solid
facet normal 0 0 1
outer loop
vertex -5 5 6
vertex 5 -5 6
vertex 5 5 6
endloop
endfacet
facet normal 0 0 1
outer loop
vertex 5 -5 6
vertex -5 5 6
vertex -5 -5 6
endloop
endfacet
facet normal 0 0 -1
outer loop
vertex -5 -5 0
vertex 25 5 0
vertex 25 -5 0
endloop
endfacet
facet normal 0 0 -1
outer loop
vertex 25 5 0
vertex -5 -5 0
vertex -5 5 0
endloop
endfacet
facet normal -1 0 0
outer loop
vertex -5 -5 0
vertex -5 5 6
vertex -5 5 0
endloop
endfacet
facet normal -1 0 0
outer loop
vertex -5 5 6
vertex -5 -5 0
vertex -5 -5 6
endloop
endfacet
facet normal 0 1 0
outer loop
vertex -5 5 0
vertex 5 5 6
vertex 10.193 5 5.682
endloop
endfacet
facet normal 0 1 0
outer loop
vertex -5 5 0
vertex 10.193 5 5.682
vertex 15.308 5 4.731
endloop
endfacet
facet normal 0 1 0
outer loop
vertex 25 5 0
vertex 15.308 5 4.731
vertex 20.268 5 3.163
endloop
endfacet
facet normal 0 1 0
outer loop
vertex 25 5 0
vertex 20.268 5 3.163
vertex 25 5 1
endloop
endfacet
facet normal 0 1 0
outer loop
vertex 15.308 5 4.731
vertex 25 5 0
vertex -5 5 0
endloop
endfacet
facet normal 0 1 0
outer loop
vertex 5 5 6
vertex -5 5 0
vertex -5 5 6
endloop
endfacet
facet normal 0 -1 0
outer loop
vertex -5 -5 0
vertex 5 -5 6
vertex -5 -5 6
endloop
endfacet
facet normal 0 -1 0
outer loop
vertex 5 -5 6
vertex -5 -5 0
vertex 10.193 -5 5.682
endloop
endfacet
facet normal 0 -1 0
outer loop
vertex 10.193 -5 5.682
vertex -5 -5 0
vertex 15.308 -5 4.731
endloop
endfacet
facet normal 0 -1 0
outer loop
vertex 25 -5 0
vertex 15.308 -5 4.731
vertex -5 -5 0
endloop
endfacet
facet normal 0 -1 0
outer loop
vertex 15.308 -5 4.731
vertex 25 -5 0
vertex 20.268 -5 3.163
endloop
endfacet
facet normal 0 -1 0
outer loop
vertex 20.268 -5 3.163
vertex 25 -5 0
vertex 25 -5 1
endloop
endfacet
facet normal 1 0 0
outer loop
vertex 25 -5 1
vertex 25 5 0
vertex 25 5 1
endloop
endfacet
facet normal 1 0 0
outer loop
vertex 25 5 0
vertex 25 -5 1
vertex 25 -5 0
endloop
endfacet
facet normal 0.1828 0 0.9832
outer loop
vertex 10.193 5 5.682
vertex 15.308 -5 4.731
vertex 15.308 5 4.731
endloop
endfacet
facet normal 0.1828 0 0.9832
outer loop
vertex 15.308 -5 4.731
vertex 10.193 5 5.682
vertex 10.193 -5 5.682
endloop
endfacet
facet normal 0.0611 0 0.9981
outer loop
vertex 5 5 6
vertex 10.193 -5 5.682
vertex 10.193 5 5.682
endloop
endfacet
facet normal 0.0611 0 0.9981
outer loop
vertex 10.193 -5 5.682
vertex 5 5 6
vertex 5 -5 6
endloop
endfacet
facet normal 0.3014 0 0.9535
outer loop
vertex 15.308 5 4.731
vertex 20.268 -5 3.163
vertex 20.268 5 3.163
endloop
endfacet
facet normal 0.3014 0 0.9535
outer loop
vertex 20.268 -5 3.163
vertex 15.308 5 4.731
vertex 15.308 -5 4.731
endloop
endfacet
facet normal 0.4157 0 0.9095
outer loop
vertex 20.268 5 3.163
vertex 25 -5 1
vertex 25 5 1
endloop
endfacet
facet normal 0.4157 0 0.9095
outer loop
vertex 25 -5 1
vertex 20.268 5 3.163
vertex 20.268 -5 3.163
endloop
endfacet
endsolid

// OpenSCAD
// brick 2x6 bow

// external vars #########################

ext_scale = 1.0;
ext_fn = 12;

// part ##################################

module brick_2x6_bow(m_scale=ext_scale,m_fn=ext_fn) {
    //
    hyp_bow = sqrt(425);
    r_bow = (hyp_bow/2)/(5/hyp_bow);
    u_bow = r_bow-6;
    ang_bow = (90-acos(5/hyp_bow))*2;
    echo (ang_bow);
    div = 4;

    pts_bow_b = [[20,1],[20,0],[-1,0],[0,6]];
    pts_bow_a = [for (i=[1:div-1]) let (ang = 90-(ang_bow/div)*i) [cos(ang)*r_bow,sin(ang)*r_bow-u_bow]];
    pts_bow = concat(pts_bow_b,pts_bow_a);
    //
    scale([m_scale,m_scale,m_scale])
    union() {
      translate([-5,-5,0]) cube([10,10,6]);
      translate([5,5,0]) rotate([90,0,0]) linear_extrude(height=10) polygon(pts_bow);
    }
}

brick_2x6_bow();
